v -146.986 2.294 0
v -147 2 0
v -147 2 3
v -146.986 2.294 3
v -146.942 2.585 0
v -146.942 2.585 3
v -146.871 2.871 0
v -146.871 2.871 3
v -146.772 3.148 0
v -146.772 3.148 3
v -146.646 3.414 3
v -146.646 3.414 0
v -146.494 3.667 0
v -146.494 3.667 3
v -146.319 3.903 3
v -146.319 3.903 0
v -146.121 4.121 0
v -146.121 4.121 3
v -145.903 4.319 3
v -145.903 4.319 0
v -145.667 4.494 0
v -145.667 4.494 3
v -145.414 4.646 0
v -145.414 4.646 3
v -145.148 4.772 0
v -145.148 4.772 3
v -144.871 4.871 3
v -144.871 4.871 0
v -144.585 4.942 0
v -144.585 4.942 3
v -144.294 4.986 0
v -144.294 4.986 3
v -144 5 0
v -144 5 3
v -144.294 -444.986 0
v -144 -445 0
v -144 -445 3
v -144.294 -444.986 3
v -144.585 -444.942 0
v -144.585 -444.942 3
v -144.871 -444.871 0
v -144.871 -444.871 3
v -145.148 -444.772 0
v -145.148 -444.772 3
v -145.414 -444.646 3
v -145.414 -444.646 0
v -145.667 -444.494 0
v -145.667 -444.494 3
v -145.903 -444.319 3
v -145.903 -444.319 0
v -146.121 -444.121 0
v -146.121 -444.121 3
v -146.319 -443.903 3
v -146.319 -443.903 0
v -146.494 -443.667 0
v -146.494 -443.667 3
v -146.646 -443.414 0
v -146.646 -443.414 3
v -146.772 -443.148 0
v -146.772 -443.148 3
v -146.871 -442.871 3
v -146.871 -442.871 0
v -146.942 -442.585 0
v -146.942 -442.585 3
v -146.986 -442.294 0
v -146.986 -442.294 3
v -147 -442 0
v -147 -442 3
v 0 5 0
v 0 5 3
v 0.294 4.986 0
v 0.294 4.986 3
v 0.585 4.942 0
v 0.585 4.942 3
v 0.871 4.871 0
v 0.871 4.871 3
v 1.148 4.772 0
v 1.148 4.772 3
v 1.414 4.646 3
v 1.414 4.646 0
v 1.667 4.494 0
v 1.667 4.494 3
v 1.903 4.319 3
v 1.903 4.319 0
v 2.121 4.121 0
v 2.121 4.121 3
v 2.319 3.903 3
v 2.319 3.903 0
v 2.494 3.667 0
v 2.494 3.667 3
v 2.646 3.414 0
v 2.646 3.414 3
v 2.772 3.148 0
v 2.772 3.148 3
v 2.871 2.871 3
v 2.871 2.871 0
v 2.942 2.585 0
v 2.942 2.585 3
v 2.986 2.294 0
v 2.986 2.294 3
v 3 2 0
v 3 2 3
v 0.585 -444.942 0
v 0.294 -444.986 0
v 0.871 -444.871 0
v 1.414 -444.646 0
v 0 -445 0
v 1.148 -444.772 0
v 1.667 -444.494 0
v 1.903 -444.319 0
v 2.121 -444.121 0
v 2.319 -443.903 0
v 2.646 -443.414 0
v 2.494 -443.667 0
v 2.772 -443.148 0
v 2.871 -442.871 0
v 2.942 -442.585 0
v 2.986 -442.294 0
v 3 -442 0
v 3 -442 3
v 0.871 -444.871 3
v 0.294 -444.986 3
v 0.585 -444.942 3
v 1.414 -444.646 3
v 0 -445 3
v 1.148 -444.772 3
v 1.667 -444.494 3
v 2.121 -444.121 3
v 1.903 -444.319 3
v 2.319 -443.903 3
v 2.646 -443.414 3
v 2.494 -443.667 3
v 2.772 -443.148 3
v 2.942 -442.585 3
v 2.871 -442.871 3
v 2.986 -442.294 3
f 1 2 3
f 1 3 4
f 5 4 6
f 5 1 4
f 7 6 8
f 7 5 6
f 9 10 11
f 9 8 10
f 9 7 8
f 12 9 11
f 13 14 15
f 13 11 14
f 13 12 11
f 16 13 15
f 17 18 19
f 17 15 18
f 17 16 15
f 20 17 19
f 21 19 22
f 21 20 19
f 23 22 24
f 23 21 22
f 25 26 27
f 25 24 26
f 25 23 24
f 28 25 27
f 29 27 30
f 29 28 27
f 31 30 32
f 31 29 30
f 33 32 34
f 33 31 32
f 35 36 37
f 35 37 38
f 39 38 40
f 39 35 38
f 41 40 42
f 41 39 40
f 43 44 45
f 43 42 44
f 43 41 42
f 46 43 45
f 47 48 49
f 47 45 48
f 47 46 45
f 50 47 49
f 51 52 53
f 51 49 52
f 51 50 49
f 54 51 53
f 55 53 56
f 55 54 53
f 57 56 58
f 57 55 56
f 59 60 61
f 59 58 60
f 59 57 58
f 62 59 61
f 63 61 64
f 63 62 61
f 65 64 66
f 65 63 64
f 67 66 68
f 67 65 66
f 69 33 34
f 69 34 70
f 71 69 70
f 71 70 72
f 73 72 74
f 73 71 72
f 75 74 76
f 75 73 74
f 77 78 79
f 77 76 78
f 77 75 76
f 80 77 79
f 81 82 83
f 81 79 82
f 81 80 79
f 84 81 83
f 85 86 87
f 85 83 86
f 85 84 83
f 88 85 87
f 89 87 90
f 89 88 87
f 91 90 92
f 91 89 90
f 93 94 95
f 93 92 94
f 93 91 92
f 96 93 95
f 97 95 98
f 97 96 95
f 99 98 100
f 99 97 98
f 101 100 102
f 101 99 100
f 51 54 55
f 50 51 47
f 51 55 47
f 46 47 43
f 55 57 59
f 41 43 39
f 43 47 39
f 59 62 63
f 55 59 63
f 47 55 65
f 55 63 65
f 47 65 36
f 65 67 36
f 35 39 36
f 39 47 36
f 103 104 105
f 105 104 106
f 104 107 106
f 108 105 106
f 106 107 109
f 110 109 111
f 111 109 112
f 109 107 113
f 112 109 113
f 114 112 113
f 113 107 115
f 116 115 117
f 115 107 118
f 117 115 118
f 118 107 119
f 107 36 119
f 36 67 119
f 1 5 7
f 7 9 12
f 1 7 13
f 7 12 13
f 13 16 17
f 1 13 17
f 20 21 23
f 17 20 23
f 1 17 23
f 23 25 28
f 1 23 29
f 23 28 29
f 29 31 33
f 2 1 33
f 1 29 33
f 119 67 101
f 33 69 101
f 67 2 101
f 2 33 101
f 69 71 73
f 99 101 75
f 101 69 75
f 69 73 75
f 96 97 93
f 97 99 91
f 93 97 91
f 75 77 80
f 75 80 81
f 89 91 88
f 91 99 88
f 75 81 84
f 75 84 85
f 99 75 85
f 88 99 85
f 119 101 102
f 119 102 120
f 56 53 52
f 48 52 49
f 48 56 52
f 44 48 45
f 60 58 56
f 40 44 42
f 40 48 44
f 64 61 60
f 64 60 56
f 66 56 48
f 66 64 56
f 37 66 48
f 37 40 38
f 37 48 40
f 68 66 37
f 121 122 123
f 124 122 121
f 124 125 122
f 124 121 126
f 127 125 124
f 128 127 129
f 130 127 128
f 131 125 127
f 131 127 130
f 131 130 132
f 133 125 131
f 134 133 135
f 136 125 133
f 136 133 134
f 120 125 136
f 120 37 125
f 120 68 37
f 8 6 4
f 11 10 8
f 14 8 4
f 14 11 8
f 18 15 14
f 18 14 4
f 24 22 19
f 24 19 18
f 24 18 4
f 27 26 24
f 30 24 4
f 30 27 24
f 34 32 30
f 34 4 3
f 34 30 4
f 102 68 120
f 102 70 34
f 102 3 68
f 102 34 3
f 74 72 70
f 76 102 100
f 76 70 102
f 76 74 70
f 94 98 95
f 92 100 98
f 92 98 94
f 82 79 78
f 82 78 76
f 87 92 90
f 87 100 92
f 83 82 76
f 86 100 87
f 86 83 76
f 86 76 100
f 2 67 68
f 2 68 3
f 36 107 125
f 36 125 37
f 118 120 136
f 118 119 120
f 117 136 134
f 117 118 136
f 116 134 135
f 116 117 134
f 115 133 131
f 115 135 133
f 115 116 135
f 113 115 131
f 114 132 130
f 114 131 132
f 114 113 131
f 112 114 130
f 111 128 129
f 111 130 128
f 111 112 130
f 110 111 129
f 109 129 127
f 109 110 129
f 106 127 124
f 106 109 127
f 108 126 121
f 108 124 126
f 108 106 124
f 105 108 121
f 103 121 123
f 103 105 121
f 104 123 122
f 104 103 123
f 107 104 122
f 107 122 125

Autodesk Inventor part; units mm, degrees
ref_plane "YZ Plane" through (0, 0, 0) normal (1, 0, 0) x (0, 1, 0)
ref_plane "XZ Plane" through (0, 0, 0) normal (0, 1, 0) x (-1, 0, 0)
ref_plane "XY Plane" through (0, 0, 0) normal (0, 0, 1) x (1, 0, 0)
sketch "Sketch1" plane through (0, 0, 0) normal (0, 0, 1) x (1, 0, 0)
  line L0 (0, -445) -> (-144, -445) projected
  arc A0 (-147, -442) -> (-144, -445) centre (-144, -442) ccw projected
  line L1 (-147, -442) -> (-147, 2) projected
  arc A1 (-144, 5) -> (-147, 2) centre (-144, 2) ccw projected
  line L2 (-144, 5) -> (0, 5) projected
  arc A2 (3, 2) -> (0, 5) centre (0, 2) ccw projected
  line L3 (3, 2) -> (3, -442) projected
  arc A3 (0, -445) -> (3, -442) centre (0, -442) ccw projected
  point P0 (0, 0)
extrude "Extrusion1" add sketch "Sketch1" along normal blind 3
properties part number "zpanel"
